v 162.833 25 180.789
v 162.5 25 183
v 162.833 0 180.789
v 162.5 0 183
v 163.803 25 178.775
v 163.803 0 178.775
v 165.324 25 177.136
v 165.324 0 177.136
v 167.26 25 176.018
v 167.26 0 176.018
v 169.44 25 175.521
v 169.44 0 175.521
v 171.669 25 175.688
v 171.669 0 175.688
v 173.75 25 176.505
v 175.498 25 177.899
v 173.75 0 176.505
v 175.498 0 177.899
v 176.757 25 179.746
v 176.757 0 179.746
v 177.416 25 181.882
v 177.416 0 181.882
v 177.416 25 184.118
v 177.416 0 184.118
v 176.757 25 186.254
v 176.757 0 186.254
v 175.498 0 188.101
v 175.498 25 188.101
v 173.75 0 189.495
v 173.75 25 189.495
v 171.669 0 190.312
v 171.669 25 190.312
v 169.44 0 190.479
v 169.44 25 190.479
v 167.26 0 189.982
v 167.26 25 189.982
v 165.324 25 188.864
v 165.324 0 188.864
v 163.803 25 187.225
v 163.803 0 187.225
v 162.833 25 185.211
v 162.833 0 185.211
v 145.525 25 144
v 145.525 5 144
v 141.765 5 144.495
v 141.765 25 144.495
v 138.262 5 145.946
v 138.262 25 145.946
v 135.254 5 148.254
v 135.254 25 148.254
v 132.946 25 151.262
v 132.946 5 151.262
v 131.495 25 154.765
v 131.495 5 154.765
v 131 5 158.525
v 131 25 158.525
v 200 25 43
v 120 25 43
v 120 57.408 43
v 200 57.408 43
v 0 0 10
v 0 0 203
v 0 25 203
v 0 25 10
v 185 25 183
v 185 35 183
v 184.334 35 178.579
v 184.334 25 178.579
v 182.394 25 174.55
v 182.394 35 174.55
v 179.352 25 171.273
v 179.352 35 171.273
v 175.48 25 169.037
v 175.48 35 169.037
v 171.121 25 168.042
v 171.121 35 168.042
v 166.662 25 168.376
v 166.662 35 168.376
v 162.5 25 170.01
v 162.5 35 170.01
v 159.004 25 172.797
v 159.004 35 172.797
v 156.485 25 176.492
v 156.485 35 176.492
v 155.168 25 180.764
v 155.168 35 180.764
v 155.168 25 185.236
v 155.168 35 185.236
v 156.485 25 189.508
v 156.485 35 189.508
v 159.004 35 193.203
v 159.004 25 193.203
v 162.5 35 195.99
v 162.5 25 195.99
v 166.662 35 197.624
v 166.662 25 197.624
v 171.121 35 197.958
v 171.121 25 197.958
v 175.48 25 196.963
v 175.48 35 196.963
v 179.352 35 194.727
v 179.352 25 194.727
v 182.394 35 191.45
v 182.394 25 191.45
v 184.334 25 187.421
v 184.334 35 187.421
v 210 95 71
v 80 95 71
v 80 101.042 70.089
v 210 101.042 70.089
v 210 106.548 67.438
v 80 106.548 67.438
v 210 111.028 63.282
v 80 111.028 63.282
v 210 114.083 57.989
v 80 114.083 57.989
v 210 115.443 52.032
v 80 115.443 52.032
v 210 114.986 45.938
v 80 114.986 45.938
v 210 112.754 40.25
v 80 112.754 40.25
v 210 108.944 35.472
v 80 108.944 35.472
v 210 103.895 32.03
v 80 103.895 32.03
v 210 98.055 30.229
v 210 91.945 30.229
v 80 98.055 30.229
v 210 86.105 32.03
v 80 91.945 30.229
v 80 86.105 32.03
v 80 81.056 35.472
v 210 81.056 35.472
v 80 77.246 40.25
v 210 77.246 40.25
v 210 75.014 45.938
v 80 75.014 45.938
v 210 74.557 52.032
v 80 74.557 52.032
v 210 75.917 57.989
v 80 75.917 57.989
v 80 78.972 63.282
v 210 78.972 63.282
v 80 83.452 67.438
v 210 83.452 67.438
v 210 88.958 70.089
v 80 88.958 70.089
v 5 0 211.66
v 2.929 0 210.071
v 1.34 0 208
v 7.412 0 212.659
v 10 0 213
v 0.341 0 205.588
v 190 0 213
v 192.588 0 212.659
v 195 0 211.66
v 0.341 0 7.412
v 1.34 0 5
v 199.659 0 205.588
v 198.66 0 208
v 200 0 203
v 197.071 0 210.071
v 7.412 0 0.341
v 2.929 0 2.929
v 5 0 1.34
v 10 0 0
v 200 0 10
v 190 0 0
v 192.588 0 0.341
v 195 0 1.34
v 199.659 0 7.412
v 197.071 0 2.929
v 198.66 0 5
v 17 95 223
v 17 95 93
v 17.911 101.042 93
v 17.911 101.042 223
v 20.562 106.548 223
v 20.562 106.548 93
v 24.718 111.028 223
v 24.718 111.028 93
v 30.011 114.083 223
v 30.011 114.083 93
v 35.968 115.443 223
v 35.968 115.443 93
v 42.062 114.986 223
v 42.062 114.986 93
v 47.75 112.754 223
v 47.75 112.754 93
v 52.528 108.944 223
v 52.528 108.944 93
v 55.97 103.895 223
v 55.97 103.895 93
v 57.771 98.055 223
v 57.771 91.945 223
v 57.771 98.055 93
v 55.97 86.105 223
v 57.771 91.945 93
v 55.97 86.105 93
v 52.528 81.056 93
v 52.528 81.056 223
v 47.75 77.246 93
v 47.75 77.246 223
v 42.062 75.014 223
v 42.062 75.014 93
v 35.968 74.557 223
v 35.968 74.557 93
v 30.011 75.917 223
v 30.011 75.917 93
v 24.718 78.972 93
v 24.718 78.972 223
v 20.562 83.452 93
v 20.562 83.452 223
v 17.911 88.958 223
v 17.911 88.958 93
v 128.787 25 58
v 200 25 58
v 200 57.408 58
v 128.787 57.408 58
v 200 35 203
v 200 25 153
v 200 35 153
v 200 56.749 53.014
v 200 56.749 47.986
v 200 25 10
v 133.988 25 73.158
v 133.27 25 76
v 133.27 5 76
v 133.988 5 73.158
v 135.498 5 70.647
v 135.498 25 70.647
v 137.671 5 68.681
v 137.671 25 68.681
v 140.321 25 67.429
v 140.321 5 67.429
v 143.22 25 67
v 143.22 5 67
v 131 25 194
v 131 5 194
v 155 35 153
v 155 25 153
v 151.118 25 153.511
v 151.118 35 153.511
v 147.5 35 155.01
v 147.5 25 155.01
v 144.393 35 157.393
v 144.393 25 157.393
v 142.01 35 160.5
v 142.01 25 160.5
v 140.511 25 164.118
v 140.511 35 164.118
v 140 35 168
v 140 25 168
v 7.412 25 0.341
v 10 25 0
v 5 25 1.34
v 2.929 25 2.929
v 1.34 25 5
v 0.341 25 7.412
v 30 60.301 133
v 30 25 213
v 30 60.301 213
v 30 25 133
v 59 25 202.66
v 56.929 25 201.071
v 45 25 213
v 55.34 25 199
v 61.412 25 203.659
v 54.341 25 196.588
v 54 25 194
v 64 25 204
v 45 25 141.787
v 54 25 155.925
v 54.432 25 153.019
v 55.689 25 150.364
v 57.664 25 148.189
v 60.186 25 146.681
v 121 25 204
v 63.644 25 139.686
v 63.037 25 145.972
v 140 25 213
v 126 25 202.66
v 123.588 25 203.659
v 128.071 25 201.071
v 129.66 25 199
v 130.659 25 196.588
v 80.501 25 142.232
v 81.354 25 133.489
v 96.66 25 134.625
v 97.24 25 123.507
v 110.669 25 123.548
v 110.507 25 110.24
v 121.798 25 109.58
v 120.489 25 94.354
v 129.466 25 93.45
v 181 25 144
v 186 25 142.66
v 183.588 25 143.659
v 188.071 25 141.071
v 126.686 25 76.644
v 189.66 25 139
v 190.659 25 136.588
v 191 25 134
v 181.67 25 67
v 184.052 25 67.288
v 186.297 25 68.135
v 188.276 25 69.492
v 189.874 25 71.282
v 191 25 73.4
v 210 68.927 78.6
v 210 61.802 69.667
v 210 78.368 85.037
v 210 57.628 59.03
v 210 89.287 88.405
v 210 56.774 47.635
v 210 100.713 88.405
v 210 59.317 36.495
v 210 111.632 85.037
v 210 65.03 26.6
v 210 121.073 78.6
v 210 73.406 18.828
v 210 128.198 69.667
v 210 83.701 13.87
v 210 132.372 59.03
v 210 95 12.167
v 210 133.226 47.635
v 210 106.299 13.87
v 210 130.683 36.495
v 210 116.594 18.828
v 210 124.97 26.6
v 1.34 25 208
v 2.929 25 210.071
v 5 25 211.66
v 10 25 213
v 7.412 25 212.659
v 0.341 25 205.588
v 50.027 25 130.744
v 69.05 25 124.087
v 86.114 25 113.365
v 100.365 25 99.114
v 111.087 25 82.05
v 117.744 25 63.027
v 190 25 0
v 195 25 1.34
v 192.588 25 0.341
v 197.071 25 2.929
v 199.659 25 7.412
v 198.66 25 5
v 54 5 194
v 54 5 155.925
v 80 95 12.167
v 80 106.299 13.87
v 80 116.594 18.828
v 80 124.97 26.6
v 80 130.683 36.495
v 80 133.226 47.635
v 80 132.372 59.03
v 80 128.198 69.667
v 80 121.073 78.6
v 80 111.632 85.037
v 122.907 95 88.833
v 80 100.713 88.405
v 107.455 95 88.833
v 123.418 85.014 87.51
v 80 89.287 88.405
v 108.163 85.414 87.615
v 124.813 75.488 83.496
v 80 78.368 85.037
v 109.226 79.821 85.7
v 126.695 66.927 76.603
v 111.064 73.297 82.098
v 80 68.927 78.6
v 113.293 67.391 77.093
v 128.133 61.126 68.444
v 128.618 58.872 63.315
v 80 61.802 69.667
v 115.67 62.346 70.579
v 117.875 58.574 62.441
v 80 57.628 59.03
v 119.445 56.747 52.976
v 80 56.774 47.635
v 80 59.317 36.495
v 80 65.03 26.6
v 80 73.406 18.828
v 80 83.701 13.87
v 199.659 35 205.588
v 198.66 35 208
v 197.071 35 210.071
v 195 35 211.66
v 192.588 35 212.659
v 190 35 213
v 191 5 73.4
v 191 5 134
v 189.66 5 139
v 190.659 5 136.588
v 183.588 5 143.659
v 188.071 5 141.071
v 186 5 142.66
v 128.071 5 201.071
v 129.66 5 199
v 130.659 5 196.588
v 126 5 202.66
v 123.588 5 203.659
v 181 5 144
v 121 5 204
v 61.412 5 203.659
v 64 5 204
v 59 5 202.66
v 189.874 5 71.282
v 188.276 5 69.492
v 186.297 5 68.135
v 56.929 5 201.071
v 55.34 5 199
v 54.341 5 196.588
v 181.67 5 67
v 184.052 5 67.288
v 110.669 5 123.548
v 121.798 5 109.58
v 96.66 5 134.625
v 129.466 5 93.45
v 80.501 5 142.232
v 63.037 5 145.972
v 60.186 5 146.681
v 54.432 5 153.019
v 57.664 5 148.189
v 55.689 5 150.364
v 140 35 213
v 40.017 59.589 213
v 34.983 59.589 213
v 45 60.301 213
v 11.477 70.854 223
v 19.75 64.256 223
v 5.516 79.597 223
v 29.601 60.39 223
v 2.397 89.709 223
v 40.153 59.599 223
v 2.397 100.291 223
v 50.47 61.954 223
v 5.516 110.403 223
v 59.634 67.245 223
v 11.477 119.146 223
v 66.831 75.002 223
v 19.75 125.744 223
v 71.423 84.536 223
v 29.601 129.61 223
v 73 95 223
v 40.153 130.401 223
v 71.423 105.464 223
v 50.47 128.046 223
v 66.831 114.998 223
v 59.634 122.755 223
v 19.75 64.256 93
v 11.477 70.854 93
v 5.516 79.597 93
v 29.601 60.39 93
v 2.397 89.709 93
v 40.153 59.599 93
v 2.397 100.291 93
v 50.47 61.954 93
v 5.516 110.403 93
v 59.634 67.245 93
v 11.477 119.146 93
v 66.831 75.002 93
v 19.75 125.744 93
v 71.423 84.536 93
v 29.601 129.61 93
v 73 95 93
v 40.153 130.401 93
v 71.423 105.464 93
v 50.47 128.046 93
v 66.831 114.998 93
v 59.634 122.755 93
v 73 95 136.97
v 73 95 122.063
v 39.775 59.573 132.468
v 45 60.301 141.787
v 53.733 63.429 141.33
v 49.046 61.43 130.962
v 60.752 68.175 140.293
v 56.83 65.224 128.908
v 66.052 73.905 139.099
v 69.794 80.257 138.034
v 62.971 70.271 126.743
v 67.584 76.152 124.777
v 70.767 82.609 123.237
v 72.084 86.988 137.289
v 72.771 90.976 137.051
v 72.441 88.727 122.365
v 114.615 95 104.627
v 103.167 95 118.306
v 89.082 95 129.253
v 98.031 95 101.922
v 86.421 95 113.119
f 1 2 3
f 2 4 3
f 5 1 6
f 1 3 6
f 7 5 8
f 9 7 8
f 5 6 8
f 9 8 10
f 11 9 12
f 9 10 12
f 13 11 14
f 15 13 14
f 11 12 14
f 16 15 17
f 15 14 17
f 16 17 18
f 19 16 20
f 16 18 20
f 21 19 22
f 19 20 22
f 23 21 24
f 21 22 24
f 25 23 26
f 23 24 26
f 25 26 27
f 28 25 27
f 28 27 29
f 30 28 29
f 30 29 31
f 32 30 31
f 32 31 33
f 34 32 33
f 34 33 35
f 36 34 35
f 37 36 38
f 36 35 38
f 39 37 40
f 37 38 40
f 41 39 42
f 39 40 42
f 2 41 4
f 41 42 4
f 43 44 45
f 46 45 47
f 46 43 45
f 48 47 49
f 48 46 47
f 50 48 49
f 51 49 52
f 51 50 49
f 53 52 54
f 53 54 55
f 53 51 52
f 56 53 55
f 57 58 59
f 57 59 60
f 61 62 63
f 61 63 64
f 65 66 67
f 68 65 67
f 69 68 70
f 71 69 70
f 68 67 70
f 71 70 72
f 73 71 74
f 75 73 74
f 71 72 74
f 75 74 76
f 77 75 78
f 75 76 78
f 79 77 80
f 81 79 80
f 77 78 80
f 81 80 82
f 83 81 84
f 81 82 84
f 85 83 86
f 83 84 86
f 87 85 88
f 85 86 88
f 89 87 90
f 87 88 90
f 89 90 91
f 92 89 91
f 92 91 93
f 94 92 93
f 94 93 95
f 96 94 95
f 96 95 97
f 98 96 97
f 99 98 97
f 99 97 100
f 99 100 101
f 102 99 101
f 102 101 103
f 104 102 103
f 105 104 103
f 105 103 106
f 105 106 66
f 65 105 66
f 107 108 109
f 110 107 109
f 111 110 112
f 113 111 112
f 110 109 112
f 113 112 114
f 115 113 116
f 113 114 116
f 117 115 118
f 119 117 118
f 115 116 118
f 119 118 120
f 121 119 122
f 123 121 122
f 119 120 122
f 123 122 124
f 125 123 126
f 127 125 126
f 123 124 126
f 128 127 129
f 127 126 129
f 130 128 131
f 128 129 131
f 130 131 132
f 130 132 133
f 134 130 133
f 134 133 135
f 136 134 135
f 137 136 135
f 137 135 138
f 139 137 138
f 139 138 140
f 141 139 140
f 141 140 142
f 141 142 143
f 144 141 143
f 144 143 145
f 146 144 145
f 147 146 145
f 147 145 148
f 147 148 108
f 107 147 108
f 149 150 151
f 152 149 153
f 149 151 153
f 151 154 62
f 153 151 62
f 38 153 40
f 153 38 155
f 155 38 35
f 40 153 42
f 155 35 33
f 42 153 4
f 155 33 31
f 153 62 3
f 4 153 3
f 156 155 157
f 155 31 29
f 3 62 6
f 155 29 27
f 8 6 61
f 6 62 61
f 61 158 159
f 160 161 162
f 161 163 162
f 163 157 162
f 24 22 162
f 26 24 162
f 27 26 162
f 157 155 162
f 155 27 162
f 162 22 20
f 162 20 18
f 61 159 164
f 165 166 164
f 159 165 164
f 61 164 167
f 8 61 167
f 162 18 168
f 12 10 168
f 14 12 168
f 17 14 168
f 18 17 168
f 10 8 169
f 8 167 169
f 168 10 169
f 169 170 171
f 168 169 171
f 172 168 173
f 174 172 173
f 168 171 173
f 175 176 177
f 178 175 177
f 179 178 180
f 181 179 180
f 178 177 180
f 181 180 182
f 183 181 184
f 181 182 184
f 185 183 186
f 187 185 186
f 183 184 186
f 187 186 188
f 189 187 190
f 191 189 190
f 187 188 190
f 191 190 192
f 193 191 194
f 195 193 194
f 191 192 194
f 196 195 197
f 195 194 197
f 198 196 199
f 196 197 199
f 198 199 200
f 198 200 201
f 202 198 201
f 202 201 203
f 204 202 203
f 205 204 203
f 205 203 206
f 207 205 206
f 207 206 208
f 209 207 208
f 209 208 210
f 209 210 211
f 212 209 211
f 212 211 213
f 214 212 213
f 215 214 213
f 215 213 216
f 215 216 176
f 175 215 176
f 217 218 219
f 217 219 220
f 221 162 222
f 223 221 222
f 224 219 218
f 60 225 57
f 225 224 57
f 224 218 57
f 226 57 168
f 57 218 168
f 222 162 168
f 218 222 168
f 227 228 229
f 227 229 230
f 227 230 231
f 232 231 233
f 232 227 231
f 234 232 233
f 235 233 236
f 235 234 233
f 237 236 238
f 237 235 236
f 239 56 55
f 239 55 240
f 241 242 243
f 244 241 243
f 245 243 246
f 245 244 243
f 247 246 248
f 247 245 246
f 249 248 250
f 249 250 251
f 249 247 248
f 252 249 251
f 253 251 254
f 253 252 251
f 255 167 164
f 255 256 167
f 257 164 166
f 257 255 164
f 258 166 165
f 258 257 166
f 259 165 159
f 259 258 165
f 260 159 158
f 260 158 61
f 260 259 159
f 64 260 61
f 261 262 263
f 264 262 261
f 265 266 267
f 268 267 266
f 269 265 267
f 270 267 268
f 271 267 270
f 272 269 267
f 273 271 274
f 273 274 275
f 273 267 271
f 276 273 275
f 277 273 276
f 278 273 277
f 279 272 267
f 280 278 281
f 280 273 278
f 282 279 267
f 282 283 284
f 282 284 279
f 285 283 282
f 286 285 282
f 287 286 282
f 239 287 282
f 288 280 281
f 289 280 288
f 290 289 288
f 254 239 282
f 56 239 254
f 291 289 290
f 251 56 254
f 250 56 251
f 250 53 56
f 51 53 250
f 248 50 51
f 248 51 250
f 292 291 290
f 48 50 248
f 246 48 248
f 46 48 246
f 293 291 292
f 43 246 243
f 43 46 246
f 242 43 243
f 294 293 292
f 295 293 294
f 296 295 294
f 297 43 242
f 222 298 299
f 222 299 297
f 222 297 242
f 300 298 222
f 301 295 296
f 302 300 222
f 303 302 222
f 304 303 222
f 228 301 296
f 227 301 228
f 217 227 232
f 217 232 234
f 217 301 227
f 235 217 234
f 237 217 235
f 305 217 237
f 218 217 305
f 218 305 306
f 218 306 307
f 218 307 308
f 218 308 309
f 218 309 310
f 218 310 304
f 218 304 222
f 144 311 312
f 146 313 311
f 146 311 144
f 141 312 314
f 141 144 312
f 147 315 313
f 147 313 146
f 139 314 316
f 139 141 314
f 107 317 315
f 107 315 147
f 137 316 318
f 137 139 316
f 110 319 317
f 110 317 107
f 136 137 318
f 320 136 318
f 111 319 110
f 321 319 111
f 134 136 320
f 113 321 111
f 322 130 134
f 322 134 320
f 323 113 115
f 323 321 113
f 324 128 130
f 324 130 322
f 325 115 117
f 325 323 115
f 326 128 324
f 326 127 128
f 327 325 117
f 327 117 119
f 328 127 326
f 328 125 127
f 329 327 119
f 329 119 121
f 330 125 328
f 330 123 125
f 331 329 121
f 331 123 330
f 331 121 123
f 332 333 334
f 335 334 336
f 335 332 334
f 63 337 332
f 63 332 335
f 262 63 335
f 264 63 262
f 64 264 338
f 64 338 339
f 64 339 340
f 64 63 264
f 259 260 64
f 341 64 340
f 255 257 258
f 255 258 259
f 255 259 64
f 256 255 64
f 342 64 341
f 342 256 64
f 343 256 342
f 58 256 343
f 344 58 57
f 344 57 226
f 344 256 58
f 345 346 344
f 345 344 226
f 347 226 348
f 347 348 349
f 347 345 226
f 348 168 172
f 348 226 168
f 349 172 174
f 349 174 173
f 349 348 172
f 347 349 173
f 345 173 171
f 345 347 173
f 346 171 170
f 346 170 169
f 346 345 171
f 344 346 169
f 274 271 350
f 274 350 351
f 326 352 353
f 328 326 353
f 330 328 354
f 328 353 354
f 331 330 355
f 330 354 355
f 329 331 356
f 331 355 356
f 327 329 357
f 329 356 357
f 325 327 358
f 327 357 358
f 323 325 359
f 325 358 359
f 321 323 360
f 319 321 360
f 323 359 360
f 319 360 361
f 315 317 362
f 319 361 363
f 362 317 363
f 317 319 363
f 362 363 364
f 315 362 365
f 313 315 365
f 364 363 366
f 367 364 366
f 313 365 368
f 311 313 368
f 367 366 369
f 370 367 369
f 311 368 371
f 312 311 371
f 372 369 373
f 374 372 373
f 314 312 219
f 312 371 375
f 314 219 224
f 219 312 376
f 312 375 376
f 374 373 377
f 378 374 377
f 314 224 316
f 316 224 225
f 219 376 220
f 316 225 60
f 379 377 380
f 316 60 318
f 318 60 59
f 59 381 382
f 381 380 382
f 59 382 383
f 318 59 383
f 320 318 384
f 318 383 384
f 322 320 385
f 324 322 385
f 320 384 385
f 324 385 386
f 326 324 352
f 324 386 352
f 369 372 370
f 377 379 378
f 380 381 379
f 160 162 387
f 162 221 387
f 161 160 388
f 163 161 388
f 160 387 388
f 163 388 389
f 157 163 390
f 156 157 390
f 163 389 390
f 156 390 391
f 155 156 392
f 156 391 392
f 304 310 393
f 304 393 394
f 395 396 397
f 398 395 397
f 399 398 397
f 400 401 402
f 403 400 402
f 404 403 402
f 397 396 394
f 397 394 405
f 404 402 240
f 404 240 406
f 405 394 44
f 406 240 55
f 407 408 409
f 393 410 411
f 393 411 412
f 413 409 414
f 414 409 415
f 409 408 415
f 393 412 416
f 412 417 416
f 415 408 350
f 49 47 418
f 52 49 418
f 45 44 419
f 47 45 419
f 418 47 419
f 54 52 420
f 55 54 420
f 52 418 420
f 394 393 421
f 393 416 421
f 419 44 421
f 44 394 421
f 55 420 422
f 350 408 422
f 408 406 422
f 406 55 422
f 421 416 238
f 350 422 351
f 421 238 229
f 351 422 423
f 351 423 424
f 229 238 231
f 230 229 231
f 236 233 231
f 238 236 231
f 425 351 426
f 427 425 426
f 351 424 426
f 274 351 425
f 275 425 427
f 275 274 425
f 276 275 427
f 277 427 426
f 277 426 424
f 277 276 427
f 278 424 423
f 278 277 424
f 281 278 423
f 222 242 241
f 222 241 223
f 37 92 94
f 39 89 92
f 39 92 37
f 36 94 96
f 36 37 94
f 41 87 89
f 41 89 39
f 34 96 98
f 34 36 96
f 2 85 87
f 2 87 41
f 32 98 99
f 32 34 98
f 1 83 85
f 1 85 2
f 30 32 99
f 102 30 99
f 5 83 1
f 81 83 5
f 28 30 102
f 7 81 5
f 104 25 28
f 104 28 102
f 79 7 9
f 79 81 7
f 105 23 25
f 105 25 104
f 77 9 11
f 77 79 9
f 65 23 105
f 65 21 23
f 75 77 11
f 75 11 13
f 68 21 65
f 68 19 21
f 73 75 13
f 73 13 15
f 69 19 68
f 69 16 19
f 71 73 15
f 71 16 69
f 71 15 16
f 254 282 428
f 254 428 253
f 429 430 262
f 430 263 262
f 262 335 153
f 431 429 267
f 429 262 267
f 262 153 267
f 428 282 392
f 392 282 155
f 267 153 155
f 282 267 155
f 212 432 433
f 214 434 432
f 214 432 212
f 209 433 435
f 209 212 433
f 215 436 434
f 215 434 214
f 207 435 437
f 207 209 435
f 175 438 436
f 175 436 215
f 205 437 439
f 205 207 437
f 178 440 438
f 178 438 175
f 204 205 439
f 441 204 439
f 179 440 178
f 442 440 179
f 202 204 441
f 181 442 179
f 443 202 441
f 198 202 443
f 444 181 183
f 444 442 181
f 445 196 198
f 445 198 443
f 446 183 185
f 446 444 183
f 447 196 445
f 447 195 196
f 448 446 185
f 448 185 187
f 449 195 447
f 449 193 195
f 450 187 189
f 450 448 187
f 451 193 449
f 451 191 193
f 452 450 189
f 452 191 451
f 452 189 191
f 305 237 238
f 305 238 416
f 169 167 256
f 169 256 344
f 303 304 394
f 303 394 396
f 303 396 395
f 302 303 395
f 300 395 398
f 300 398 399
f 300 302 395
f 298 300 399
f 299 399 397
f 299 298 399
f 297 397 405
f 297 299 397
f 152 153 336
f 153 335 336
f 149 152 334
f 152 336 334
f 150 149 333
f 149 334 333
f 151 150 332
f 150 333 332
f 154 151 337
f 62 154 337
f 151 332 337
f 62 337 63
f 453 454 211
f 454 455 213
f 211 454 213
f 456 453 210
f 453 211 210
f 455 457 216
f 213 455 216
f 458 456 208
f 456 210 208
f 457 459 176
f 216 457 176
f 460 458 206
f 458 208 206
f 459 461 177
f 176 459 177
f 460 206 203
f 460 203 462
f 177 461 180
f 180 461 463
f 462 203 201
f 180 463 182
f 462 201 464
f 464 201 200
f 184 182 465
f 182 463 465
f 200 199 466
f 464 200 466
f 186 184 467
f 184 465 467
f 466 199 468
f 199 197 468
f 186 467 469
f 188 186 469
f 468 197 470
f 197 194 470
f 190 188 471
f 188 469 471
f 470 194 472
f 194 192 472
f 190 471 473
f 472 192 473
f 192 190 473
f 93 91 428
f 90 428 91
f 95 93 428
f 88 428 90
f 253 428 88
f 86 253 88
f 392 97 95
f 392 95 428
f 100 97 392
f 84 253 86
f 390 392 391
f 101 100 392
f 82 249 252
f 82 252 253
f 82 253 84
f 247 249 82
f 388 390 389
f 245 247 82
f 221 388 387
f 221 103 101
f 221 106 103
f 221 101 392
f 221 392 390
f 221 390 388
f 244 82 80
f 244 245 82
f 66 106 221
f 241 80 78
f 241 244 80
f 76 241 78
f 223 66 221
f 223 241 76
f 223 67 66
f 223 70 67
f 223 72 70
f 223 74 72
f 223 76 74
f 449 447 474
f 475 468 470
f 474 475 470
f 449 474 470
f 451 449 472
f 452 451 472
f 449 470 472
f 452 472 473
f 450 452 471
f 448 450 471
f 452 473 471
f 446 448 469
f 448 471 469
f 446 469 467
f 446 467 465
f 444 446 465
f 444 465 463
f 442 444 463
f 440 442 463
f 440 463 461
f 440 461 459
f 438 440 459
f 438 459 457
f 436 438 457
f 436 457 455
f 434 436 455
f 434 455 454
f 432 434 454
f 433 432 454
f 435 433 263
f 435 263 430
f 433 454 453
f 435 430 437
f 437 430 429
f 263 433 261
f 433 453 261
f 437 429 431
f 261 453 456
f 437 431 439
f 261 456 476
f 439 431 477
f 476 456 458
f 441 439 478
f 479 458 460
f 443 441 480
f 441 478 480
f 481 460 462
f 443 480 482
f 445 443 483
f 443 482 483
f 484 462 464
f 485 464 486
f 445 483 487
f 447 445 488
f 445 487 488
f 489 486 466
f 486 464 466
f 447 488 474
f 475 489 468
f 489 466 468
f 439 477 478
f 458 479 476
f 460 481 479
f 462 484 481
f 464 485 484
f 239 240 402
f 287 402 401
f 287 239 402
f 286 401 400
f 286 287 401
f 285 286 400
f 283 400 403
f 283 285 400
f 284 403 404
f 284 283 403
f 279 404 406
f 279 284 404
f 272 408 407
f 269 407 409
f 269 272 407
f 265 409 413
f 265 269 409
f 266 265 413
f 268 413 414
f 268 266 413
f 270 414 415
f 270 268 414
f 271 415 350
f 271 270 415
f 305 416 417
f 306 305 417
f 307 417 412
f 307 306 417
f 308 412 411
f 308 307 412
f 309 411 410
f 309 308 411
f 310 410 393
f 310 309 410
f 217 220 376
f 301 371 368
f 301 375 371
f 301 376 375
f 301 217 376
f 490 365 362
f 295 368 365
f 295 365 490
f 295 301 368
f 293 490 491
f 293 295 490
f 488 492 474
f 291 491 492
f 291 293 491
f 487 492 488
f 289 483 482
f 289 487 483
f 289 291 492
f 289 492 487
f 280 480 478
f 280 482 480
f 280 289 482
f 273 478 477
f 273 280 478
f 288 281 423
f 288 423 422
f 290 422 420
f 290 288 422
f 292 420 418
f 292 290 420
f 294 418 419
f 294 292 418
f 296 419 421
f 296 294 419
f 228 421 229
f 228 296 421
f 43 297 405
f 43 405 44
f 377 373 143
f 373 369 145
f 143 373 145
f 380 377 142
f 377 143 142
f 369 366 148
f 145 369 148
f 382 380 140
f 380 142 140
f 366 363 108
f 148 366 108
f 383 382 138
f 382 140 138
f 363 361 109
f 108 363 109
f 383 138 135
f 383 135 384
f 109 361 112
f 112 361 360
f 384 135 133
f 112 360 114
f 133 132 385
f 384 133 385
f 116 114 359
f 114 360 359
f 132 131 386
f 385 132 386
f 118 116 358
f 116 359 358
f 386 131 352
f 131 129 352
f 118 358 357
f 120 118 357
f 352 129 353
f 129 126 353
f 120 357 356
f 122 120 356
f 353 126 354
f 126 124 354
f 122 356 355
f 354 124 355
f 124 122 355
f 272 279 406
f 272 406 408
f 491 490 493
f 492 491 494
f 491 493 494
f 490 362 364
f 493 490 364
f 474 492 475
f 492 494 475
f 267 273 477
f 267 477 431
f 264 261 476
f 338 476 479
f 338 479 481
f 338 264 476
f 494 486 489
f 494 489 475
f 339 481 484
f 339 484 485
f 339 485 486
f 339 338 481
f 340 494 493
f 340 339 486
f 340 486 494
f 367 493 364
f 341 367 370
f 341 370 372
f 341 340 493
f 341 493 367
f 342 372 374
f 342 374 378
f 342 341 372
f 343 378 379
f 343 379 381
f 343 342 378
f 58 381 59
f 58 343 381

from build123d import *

# Parameters (mm, degrees)
SKETCH1_W                               = 200
SKETCH1_H                               = 213
BOSS_EXTRUDE1_DEPTH                     = 25
SKETCH2_W                               = 60
SKETCH2_H                               = 60
BOSS_EXTRUDE2_DEPTH                     = 10
CUT_EXTRUDE1_DEPTH                      = 20
BOSS_EXTRUDE3_DEPTH                     = 70
BOSS_EXTRUDE5_DEPTH                     = 10
BOSS_EXTRUDE5_DEPTH_BACK                = 120
SKETCH6_R                               = 35.5
BOSS_EXTRUDE6_DEPTH                     = 10
BOSS_EXTRUDE6_DEPTH_BACK                = 120
SKETCH7_R                               = 38.333333333
F_12_0_41_DIAMETER_HOLE1_D              = 41
F_12_0MM_DOWEL_HOLE1_D                  = 41
CBORE_FOR_M8_HEX_HEAD_BOLT1_D           = 15
CBORE_FOR_M8_HEX_HEAD_BOLT1_CBORE_D     = 30
CBORE_FOR_M8_HEX_HEAD_BOLT1_CBORE_DEPTH = 10
FILLET1_R                               = 10
FILLET2_R                               = 15


with BuildPart() as part:
    # Sketch1 → Boss-Extrude1 (new body)
    with BuildSketch(Plane(origin=(0, 0, 0), x_dir=(1, 0, 0), z_dir=(0, 1, 0))):
        with Locations((100, -106.5)):
            Rectangle(SKETCH1_W, SKETCH1_H)
    extrude(amount=BOSS_EXTRUDE1_DEPTH)

    # Sketch2 → Boss-Extrude2 (add)
    with BuildSketch(Plane(origin=(0, 25, 0), x_dir=(1, 0, 0), z_dir=(0, 1, 0))):
        with Locations((170, -183)):
            Rectangle(SKETCH2_W, SKETCH2_H)
    extrude(amount=BOSS_EXTRUDE2_DEPTH)

    # Sketch5 → Cut-Extrude1 (cut)
    with BuildSketch(Plane(origin=(0, 25, 0), x_dir=(1, 0, 0), z_dir=(0, 1, 0))):
        with BuildLine():
            Line((191, -73.400231973), (191, -134))
            ThreePointArc((191, -134), (188.071067812, -141.071067812), (181, -144))
            Line((181, -144), (145.524792721, -144))
            ThreePointArc((145.524792721, -144), (135.254213293, -148.254213293), (131, -158.524792721))
            Line((131, -158.524792721), (131, -194))
            ThreePointArc((131, -194), (128.071067812, -201.071067812), (121, -204))
            Line((121, -204), (64, -204))
            ThreePointArc((64, -204), (56.928932188, -201.071067812), (54, -194))
            Line((54, -194), (54, -155.925475005))
            ThreePointArc((54, -155.925475005), (56.596304606, -149.203474223), (63.037058903, -145.97194576))
            ThreePointArc((63.037058903, -145.97194576), (110.669303842, -123.548265985), (133.270417334, -75.999955378))
            ThreePointArc((133.270417334, -75.999955378), (136.512099917, -69.583786471), (143.22028722, -67))
            Line((143.22028722, -67), (181.67038746, -67))
            ThreePointArc((181.67038746, -67), (187.327344227, -68.753859076), (191, -73.400231973))
        make_face()
    extrude(amount=-CUT_EXTRUDE1_DEPTH, mode=Mode.SUBTRACT)

    # Sketch3 → Boss-Extrude3 (add)
    with BuildSketch(Plane(origin=(0, 25, 0), x_dir=(1, 0, 0), z_dir=(0, 1, 0))):
        with BuildLine():
            Line((30, -213), (30, -133))
            ThreePointArc((30, -133), (93.639610307, -106.639610307), (120, -43))
            Line((120, -43), (200, -43))
            Line((200, -43), (200, -58))
            Line((200, -58), (128.786796564, -58))
            ThreePointArc((128.786796564, -58), (104.246212025, -117.246212025), (45, -141.786796564))
            Line((45, -141.786796564), (45, -213))
            Line((45, -213), (30, -213))
        make_face()
    extrude(amount=BOSS_EXTRUDE3_DEPTH)

    # Sketch6 → Boss-Extrude5 (add, two sides: drawn at the far end of the back side and taken through both)
    with BuildSketch(Plane.XY.offset(213).offset(-BOSS_EXTRUDE5_DEPTH_BACK)):
        with Locations((37.5, 95)):
            Circle(SKETCH6_R)
    extrude(amount=BOSS_EXTRUDE5_DEPTH + BOSS_EXTRUDE5_DEPTH_BACK)

    # Sketch7 → Boss-Extrude6 (add, two sides: drawn at the far end of the back side and taken through both)
    with BuildSketch(Plane(origin=(200, 0, 0), x_dir=(0, 0, -1), z_dir=(1, 0, 0)).offset(-BOSS_EXTRUDE6_DEPTH_BACK)):
        with Locations((-50.5, 95)):
            Circle(SKETCH7_R)
    extrude(amount=BOSS_EXTRUDE6_DEPTH + BOSS_EXTRUDE6_DEPTH_BACK)

    # Ø12.0 (41) Diameter Hole1 (through all)
    with Locations(Plane(origin=(210, 0, 0), x_dir=(0, 0, -1), z_dir=(1, 0, 0))):
        with Locations((-50.5, 95)):
            Hole(F_12_0_41_DIAMETER_HOLE1_D / 2)

    # Ø12.0mm Dowel Hole1 (through all)
    with Locations(Plane.XY.offset(223)):
        with Locations((37.5, 95)):
            Hole(F_12_0MM_DOWEL_HOLE1_D / 2)

    # CBORE for M8 Hex Head Bolt1 (through all)
    with Locations(Plane(origin=(0, 35, 0), x_dir=(1, 0, 0), z_dir=(0, 1, 0))):
        with Locations((170, -183)):
            CounterBoreHole(CBORE_FOR_M8_HEX_HEAD_BOLT1_D / 2, CBORE_FOR_M8_HEX_HEAD_BOLT1_CBORE_D / 2, CBORE_FOR_M8_HEX_HEAD_BOLT1_CBORE_DEPTH)

    # Fillet1
    fillet1_edges = [part.edges().sort_by_distance(p)[0] for p in [
        (0, 12.5, 0),
        (200, 12.5, 0),
        (200, 17.5, 213),
        (0, 12.5, 213),
    ]]
    fillet(fillet1_edges, radius=FILLET1_R)

    # Fillet2
    fillet2_edges = [part.edges().sort_by_distance(p)[0] for p in [
        (140, 30, 153),
    ]]
    fillet(fillet2_edges, radius=FILLET2_R)


solid = part.part
